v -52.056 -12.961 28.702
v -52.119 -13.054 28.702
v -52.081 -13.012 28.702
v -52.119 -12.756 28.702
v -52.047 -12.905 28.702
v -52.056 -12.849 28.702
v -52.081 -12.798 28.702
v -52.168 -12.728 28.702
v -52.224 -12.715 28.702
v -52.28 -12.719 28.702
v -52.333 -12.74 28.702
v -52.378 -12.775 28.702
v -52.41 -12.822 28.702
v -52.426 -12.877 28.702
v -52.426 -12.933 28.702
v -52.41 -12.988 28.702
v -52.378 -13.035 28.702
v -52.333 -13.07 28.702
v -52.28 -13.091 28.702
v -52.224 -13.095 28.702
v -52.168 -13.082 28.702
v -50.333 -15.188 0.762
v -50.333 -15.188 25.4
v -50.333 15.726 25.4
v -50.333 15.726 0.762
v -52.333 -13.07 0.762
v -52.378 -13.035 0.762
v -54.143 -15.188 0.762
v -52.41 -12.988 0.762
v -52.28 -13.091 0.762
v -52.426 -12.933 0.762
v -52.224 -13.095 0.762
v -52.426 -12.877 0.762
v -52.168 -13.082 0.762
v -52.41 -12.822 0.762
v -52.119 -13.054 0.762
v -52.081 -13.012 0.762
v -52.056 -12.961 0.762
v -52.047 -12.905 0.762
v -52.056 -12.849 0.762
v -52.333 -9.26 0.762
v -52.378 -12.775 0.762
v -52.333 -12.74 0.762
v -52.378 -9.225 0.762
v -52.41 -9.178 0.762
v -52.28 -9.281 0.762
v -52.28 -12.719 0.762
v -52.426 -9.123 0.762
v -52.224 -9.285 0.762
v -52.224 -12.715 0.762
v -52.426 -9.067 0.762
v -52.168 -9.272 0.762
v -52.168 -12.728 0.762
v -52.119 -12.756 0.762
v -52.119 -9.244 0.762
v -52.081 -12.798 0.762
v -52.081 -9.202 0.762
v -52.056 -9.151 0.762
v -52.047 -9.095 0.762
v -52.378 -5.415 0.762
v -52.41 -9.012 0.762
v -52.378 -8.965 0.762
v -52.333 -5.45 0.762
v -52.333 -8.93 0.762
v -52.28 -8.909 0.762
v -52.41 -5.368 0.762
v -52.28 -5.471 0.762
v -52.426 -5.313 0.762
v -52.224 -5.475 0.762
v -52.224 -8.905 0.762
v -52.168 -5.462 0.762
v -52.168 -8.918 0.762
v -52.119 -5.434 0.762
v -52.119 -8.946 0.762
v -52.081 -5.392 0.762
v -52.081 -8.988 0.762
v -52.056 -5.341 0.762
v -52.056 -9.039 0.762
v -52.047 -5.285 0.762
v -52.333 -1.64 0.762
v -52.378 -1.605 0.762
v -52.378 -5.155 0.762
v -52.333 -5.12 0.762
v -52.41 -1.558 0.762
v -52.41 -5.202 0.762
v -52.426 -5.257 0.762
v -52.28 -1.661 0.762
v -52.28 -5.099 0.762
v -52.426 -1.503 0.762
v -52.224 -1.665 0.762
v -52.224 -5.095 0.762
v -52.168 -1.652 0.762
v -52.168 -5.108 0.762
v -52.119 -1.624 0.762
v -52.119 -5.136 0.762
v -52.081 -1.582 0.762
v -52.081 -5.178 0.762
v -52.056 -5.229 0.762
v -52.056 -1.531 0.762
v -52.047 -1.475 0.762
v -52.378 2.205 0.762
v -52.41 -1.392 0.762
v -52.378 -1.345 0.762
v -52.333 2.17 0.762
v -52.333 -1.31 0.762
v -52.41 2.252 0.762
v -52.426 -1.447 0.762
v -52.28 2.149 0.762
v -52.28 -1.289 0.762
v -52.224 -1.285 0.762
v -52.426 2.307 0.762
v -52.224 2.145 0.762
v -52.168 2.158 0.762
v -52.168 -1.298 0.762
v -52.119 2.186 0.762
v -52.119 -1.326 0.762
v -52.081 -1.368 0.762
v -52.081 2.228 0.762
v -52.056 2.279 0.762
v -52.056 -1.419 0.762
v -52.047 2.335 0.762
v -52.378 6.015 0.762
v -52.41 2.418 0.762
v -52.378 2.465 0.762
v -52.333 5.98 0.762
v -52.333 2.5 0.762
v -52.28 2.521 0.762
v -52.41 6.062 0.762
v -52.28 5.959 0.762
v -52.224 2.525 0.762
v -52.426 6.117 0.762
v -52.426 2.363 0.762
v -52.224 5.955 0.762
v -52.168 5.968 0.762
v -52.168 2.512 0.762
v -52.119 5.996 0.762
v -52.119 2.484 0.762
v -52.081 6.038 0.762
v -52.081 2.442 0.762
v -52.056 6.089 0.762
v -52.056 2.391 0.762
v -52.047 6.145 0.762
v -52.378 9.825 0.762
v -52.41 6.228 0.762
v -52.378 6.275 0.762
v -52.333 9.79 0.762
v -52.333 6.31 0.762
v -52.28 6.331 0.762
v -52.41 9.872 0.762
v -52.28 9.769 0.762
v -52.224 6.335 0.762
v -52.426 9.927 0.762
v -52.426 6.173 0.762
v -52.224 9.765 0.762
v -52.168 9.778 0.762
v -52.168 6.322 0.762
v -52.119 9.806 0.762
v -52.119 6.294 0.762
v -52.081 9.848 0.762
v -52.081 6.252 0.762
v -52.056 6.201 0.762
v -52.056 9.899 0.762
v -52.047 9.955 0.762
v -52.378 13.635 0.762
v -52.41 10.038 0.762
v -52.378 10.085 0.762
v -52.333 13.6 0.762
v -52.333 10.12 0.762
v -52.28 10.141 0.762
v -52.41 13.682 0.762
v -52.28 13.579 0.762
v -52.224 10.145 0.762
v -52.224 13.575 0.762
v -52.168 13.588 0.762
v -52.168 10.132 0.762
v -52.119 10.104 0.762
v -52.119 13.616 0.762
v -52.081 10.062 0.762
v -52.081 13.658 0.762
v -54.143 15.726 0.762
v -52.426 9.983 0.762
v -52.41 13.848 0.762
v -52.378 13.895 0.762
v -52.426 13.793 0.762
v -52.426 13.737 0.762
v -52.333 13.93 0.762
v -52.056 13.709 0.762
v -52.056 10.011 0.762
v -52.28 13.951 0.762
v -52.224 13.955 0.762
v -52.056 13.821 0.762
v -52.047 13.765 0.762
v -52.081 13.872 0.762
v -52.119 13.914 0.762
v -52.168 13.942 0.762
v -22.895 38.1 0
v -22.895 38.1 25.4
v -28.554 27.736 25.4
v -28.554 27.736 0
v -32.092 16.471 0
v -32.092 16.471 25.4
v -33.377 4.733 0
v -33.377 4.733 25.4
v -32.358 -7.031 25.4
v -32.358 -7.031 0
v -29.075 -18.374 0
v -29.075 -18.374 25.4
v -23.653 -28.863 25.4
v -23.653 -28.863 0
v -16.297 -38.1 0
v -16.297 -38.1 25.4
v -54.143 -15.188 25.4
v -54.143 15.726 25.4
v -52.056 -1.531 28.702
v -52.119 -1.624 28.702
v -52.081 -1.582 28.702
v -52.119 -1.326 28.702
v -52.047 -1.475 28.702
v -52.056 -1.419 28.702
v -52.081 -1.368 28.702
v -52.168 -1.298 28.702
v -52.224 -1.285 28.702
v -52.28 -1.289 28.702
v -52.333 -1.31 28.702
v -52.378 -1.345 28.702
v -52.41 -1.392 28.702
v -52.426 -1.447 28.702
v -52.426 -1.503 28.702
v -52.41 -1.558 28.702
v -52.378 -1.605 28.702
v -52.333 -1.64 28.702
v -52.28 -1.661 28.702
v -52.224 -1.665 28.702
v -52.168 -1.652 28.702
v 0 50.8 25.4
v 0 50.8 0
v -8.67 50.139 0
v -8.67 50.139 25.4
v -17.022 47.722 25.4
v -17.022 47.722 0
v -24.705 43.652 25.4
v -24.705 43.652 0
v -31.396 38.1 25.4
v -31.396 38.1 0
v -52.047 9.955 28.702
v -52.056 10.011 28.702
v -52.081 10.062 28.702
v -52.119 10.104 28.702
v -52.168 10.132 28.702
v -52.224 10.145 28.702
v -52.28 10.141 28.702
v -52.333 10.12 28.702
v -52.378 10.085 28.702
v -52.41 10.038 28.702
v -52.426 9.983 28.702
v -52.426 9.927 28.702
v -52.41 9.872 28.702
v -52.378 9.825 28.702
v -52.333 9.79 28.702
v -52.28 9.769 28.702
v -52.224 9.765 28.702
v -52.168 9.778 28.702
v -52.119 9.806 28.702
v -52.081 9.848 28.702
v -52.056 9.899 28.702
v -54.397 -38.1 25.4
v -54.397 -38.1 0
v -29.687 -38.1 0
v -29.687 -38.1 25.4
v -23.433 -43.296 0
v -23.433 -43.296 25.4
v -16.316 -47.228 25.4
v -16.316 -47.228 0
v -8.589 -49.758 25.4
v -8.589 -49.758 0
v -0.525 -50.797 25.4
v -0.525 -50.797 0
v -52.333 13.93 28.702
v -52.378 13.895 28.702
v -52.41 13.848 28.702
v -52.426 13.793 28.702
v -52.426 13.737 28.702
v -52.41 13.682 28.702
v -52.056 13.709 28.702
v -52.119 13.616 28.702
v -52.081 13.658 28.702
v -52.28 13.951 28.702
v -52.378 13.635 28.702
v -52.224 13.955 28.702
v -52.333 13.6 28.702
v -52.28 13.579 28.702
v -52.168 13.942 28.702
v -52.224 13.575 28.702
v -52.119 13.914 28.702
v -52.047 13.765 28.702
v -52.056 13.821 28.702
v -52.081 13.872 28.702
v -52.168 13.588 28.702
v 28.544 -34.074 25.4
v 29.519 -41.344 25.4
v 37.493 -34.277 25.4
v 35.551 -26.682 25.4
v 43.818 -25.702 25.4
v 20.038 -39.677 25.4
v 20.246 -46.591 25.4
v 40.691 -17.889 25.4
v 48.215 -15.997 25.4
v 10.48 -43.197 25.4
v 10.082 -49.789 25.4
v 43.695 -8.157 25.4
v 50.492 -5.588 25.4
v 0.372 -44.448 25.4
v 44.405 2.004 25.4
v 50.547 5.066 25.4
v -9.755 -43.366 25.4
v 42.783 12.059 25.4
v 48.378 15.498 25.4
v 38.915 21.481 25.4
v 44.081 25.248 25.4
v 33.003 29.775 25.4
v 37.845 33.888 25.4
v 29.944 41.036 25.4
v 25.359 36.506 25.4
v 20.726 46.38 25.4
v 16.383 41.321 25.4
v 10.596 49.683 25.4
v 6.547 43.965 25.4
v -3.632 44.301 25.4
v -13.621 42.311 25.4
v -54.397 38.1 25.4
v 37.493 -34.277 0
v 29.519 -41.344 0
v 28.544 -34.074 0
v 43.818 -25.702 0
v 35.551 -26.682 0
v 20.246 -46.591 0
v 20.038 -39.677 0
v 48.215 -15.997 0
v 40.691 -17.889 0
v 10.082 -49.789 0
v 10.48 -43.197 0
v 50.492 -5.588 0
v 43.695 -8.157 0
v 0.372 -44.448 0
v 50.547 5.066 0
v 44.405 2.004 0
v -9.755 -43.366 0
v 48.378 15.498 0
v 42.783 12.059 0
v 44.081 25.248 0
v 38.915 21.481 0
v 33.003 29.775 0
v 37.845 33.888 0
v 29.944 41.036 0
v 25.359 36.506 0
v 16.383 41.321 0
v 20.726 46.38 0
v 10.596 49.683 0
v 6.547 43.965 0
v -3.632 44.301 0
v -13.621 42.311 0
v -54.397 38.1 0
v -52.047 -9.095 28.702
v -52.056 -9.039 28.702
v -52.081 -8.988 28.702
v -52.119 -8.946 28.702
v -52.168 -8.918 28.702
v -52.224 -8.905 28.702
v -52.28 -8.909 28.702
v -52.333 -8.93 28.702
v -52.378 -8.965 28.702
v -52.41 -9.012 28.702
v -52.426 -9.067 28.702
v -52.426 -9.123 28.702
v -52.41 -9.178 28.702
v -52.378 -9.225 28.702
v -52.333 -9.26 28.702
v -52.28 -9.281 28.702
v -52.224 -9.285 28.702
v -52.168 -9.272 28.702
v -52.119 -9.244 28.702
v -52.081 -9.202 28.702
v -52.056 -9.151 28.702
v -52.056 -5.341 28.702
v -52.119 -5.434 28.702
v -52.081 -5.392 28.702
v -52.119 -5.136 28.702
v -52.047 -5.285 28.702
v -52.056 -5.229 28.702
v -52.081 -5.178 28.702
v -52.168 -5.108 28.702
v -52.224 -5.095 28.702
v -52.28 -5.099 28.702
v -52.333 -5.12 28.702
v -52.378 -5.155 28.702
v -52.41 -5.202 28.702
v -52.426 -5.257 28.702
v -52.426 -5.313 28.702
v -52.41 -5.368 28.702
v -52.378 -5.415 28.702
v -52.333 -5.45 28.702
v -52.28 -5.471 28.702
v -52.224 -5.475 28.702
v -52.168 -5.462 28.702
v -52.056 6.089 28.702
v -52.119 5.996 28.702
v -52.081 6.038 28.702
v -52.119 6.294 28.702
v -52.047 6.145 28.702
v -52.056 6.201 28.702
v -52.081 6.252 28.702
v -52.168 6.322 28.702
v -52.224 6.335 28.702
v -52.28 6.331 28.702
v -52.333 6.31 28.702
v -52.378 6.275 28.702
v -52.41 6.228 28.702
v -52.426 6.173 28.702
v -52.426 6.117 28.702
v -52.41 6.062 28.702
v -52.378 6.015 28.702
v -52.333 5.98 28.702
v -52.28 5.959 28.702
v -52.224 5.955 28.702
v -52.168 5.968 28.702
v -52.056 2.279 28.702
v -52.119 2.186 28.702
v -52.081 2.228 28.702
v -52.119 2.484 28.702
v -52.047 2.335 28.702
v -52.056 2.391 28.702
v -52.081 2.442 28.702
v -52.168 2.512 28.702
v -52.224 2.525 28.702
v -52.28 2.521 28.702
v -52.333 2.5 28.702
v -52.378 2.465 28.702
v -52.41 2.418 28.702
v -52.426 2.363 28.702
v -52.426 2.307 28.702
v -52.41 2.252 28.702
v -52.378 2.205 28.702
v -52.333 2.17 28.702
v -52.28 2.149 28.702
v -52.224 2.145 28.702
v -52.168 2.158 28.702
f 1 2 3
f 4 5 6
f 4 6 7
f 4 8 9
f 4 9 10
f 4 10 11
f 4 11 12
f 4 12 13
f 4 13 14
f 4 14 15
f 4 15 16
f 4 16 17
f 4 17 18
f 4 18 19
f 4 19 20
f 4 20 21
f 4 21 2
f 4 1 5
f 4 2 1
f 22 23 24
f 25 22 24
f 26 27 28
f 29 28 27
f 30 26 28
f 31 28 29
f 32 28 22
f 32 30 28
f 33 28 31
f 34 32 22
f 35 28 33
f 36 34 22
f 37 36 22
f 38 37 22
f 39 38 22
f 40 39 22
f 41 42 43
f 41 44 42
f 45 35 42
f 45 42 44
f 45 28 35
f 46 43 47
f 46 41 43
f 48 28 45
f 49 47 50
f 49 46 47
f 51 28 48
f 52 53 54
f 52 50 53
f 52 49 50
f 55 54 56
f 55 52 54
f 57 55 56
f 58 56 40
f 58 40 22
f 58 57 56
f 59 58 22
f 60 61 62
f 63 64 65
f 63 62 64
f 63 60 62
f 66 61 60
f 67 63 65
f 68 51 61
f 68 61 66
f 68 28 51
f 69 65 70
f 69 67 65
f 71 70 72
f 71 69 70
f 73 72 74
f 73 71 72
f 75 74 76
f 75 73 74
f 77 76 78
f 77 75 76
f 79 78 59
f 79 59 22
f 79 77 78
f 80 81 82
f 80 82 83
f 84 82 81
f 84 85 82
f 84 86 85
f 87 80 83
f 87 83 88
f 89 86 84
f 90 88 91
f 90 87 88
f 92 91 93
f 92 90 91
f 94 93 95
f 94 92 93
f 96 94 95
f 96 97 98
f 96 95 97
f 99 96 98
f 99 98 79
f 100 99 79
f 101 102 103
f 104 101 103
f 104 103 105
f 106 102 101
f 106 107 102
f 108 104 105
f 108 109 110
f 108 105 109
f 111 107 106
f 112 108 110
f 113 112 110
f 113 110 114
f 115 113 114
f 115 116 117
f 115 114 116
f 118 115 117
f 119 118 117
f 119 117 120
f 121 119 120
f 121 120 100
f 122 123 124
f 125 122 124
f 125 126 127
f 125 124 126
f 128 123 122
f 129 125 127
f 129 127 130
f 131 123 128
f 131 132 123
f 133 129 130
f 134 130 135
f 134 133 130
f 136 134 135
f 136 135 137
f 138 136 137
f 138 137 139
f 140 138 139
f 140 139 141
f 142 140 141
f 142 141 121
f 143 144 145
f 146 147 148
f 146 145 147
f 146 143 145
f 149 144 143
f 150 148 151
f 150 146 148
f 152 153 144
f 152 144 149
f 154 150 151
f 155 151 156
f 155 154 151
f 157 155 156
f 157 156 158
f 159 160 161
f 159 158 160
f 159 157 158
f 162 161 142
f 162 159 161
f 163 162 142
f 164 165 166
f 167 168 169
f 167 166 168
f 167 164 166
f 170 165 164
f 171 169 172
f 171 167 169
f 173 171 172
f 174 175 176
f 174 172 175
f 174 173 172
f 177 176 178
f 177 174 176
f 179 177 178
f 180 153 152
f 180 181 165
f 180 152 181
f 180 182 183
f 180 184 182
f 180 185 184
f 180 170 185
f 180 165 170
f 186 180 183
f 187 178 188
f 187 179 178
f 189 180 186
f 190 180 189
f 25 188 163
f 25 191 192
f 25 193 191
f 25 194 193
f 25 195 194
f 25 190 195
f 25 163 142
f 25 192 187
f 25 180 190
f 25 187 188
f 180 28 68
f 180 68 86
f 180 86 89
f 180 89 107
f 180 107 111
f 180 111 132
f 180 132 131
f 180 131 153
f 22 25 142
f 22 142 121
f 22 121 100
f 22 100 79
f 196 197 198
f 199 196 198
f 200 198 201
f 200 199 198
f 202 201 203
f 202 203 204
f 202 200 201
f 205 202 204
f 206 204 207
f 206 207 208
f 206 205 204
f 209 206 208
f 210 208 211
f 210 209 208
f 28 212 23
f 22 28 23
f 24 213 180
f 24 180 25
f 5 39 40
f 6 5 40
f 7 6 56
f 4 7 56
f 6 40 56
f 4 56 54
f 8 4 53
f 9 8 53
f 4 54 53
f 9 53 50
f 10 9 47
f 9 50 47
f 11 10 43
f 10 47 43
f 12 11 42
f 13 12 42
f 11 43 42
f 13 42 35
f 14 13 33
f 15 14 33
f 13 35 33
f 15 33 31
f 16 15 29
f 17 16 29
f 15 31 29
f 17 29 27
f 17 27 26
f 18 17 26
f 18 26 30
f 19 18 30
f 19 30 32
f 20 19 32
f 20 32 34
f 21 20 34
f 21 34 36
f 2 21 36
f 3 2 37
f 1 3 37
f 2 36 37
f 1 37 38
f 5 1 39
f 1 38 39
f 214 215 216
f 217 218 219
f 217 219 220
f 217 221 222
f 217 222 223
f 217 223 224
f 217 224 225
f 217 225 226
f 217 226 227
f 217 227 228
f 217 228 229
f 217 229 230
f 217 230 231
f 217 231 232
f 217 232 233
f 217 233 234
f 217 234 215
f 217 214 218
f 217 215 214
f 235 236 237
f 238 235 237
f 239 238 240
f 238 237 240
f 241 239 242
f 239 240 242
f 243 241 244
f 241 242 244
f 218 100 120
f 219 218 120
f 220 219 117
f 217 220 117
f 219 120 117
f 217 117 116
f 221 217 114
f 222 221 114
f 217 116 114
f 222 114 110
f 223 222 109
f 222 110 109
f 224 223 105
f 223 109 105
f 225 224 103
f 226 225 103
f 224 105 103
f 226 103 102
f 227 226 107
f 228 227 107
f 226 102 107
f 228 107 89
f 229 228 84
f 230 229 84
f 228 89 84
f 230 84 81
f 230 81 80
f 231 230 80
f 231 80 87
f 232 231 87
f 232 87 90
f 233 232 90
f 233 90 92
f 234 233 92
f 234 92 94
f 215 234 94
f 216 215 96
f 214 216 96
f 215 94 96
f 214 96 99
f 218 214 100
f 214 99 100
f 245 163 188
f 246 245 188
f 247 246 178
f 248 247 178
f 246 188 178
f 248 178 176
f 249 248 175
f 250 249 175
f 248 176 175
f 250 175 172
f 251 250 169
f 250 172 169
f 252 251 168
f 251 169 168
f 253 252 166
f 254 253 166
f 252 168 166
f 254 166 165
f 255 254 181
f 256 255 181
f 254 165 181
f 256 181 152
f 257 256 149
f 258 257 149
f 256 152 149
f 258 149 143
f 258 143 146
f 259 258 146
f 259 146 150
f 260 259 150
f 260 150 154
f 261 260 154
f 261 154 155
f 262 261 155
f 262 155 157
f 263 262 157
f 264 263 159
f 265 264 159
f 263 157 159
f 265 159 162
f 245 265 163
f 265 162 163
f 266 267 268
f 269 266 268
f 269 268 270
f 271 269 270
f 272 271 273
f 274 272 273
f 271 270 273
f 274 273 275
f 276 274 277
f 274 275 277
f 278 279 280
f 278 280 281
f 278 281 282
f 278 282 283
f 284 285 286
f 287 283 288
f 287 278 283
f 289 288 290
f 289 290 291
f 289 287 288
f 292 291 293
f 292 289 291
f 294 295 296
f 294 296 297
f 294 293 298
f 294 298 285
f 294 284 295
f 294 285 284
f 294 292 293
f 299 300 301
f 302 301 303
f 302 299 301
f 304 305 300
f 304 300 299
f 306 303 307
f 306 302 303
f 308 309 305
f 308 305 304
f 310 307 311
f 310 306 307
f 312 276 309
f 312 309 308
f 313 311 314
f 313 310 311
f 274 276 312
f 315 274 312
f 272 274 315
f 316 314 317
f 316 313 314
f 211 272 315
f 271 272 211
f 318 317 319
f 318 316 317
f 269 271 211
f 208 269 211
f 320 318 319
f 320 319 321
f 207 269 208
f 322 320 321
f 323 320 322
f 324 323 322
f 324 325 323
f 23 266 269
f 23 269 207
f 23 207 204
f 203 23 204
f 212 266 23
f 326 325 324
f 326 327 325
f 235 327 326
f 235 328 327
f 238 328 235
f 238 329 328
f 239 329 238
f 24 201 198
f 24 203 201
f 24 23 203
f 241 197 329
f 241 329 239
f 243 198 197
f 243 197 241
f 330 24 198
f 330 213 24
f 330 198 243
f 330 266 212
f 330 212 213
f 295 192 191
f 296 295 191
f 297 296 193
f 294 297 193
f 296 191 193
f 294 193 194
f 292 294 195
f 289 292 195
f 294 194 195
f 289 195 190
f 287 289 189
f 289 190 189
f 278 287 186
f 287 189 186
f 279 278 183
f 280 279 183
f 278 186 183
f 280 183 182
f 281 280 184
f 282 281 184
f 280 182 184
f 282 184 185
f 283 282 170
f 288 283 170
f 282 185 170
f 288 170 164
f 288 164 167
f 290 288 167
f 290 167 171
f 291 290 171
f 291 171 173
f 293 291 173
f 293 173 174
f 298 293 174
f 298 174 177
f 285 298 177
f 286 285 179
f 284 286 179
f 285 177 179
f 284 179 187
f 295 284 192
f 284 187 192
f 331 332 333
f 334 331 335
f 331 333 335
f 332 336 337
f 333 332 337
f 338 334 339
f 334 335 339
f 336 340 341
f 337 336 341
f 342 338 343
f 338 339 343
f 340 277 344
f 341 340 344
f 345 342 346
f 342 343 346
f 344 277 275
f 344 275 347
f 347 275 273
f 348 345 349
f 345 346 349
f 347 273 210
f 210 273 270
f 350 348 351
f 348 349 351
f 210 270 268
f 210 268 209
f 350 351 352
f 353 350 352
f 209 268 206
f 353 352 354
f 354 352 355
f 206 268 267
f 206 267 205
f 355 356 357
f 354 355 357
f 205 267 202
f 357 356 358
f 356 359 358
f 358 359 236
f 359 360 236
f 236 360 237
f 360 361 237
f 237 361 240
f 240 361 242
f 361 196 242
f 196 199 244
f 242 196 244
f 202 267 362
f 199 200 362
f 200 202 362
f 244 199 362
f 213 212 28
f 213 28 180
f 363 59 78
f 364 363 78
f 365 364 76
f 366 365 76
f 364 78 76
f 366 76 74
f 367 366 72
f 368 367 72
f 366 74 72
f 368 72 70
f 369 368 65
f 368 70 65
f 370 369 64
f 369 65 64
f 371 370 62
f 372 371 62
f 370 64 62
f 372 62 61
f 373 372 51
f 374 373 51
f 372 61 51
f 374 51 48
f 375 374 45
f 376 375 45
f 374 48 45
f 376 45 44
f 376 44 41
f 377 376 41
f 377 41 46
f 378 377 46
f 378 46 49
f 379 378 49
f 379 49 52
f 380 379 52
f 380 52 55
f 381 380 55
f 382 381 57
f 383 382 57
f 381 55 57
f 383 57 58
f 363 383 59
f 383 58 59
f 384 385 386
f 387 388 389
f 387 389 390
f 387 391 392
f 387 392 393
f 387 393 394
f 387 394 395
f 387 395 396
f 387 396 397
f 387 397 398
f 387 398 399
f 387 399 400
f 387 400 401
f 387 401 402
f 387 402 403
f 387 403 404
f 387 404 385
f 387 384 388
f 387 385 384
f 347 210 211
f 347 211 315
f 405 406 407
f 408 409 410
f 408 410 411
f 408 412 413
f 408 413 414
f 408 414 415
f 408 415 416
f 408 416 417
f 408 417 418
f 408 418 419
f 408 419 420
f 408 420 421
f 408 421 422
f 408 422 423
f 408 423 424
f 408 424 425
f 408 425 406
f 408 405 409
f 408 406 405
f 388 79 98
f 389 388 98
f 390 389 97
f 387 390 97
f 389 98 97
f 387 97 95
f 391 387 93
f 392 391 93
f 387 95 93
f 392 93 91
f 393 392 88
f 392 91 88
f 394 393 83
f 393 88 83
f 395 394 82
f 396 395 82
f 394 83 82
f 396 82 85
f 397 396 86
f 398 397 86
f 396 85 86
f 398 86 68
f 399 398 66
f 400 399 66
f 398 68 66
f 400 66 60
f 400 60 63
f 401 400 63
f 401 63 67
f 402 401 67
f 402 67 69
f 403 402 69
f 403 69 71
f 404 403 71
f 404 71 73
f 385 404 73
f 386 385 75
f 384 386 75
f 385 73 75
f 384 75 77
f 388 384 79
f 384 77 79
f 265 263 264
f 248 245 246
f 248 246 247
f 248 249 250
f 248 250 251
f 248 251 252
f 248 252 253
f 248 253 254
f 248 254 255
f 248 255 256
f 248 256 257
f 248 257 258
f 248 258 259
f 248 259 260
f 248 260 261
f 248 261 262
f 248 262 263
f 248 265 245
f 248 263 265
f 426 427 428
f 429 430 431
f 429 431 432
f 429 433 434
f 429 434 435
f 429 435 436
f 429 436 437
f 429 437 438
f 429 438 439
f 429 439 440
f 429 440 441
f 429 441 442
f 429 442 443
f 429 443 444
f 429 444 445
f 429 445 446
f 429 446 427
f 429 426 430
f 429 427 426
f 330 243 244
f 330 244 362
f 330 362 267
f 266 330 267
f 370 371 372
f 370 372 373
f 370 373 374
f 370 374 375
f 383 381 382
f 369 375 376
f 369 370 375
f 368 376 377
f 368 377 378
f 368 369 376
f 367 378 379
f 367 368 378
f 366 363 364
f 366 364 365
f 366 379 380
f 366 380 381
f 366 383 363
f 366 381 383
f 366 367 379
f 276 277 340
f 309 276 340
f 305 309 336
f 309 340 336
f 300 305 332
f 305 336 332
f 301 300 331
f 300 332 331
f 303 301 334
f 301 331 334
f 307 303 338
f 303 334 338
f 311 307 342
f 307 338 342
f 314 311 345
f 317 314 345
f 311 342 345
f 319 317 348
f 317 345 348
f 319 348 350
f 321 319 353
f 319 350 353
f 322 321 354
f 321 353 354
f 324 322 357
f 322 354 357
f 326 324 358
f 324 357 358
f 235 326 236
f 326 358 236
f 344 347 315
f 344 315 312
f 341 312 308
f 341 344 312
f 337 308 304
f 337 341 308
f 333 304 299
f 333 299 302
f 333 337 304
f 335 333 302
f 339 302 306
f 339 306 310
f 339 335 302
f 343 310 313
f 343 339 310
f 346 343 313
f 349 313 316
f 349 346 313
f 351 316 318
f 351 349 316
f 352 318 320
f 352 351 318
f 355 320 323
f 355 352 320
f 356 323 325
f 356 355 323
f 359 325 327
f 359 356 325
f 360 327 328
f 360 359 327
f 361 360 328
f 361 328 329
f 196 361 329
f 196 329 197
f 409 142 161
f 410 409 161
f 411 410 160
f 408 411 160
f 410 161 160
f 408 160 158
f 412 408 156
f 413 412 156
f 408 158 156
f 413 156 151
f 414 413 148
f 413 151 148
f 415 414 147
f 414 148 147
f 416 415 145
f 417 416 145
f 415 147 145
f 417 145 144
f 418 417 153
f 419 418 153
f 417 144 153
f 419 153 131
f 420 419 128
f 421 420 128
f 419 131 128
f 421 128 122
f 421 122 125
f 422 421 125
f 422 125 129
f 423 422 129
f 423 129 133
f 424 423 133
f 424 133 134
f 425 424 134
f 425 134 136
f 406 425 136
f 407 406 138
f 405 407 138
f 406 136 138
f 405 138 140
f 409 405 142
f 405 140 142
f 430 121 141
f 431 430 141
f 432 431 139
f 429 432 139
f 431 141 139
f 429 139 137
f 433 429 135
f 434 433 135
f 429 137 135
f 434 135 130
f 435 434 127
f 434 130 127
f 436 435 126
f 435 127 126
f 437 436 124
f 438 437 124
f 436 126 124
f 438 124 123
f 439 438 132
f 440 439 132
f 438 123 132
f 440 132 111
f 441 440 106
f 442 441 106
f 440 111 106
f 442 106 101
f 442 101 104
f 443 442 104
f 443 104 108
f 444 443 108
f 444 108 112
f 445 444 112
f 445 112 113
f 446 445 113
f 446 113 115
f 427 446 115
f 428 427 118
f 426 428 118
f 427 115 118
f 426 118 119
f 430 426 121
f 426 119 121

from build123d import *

# Parameters (mm, degrees)
BOSS_EXTRUDE1_DEPTH = 25.4
SKETCH2_W           = 3.81
SKETCH2_H           = 30.913886478
CUT_EXTRUDE1_DEPTH  = 24.638
SKETCH3_R           = 0.1905
BOSS_EXTRUDE2_DEPTH = 27.94


with BuildPart() as part:
    # Sketch1 → Boss-Extrude1 (new body)
    with BuildSketch(Plane(origin=(0, 0, 0), x_dir=(0, 1, 0), z_dir=(0, 0, 1))):
        with BuildLine():
            Line((38.1, 31.396083107), (38.1, 54.3969813))
            Line((38.1, 54.3969813), (-38.1, 54.3969813))
            Line((-38.1, 54.3969813), (-38.1, 29.686927473))
            ThreePointArc((-38.1, 29.686927473), (-47.228063928, 16.31611269), (-50.79728762, 0.524948031))
            ThreePointArc((-50.79728762, 0.524948031), (-0.262477519, -50.799321901), (50.8, 0))
            ThreePointArc((50.8, 0), (47.722223419, 17.021685566), (38.1, 31.396083107))
        make_face()
        with BuildLine():
            Line((-38.1, 16.2969813), (-43.366277143, 9.755434728))
            ThreePointArc((-43.366277143, 9.755434728), (7.077931126, -43.882859877), (38.1, 22.895250599))
            ThreePointArc((38.1, 22.895250599), (-1.174082446, 33.154986969), (-38.1, 16.2969813))
        make_face(mode=Mode.SUBTRACT)
    extrude(amount=BOSS_EXTRUDE1_DEPTH)

    # Sketch2 → Cut-Extrude1 (cut)
    with BuildSketch(Plane.XY.offset(25.4)):
        with Locations((-52.2379813, 0.268816404)):
            Rectangle(SKETCH2_W, SKETCH2_H)
    extrude(amount=-CUT_EXTRUDE1_DEPTH, mode=Mode.SUBTRACT)

    # Sketch3 → Boss-Extrude2 (add)
    with BuildSketch(Plane.XY.offset(0.762)):
        with Locations((-52.2379813, -12.905010915)):
            Circle(SKETCH3_R)
        with Locations((-52.2379813, -9.095010915)):
            Circle(SKETCH3_R)
        with Locations((-52.2379813, -5.285010915)):
            Circle(SKETCH3_R)
        with Locations((-52.2379813, -1.475010915)):
            Circle(SKETCH3_R)
        with Locations((-52.2379813, 2.334989085)):
            Circle(SKETCH3_R)
        with Locations((-52.2379813, 6.144989085)):
            Circle(SKETCH3_R)
        with Locations((-52.2379813, 9.954989085)):
            Circle(SKETCH3_R)
        with Locations((-52.2379813, 13.764989085)):
            Circle(SKETCH3_R)
    extrude(amount=BOSS_EXTRUDE2_DEPTH)


solid = part.part
